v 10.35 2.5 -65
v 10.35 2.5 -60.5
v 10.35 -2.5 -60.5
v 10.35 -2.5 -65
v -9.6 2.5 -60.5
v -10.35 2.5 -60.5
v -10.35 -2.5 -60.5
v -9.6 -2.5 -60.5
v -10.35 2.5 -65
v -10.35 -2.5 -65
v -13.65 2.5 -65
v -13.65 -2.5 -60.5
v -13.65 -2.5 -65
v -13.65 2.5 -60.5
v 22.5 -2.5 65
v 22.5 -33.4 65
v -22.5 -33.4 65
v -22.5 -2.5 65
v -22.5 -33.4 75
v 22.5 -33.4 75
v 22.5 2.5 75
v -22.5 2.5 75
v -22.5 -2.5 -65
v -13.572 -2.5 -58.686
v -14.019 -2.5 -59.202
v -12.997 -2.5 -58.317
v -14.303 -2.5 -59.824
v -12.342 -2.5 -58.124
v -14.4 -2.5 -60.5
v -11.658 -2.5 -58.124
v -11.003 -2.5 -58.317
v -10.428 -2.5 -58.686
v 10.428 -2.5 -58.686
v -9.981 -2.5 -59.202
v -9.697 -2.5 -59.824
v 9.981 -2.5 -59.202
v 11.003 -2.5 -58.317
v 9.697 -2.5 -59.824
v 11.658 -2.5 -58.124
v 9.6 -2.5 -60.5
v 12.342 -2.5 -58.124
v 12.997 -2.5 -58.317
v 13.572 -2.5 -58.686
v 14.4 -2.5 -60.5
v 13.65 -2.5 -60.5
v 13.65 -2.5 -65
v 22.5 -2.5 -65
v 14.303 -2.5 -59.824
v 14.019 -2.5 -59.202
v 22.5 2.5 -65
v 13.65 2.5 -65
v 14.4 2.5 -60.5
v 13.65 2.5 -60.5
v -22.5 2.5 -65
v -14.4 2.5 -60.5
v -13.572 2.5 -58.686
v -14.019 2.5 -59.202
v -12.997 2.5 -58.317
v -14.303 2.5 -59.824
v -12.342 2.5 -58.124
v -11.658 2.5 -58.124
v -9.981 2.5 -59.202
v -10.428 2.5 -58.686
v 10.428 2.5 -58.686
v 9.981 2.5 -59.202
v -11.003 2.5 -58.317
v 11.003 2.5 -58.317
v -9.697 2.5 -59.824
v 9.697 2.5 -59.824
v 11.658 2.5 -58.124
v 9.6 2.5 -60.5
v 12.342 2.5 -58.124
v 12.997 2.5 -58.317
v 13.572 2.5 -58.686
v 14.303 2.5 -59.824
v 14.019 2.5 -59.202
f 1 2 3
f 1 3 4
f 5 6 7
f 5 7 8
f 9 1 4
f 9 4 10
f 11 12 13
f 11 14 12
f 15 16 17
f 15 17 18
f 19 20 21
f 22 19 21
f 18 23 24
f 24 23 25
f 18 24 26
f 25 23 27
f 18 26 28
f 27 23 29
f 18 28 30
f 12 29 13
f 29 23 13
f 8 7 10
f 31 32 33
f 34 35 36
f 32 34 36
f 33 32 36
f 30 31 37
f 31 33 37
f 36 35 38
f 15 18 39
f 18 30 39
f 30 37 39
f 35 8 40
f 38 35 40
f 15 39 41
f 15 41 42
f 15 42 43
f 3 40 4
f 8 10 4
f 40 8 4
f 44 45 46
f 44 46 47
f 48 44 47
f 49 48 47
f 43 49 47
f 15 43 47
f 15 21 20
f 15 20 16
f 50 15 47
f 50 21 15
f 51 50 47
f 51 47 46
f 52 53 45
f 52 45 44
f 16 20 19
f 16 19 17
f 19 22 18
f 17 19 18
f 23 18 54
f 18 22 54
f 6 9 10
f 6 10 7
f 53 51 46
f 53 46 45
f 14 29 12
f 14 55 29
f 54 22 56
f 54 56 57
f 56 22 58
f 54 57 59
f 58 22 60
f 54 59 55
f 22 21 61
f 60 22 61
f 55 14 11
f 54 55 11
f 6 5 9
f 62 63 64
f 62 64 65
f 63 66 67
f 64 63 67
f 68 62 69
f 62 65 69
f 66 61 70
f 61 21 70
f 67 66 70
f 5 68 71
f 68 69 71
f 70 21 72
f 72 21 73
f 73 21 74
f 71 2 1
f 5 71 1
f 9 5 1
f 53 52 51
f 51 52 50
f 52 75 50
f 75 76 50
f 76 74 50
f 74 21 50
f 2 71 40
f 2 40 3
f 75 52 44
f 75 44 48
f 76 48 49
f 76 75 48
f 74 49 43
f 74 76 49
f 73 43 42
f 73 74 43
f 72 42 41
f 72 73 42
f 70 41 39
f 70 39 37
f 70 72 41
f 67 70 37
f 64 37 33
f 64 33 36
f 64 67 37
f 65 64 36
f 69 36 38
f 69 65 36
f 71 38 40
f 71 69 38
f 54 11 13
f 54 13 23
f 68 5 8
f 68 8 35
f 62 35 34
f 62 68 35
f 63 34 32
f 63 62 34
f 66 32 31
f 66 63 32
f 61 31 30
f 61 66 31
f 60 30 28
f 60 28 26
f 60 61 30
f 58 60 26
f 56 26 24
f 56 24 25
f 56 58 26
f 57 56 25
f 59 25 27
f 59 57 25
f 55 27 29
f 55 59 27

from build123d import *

# Parameters (mm, degrees)
BOSS_EXTRUDE1_DEPTH = 2.5
SKETCH4_W           = 54.285
SKETCH4_H           = 130
CUT_EXTRUDE1_DEPTH  = 120
SKETCH5_W           = 10
SKETCH5_H           = 35.9
BOSS_EXTRUDE2_DEPTH = 22.5


with BuildPart() as part:
    # Sketch2 → Boss-Extrude1 (new, symmetric)
    with BuildSketch(Plane(origin=(0, 0, 0), x_dir=(1, 0, 0), z_dir=(0, 1, 0))):
        with BuildLine():
            Line((-13.65, 65), (-76.785, 65))
            Line((-76.785, 65), (-76.785, -65))
            Line((-76.785, -65), (76.785, -65))
            Line((76.785, -65), (76.785, 65))
            Line((76.785, 65), (13.65, 65))
            Line((13.65, 65), (13.65, 60.5))
            Line((13.65, 60.5), (14.4, 60.5))
            ThreePointArc((14.4, 60.5), (12, 58.1), (9.6, 60.5))
            Line((9.6, 60.5), (10.35, 60.5))
            Line((10.35, 60.5), (10.35, 65))
            Line((10.35, 65), (-10.35, 65))
            Line((-10.35, 65), (-10.35, 60.5))
            Line((-10.35, 60.5), (-9.6, 60.5))
            ThreePointArc((-9.6, 60.5), (-12, 58.1), (-14.4, 60.5))
            Line((-14.4, 60.5), (-13.65, 60.5))
            Line((-13.65, 60.5), (-13.65, 65))
        make_face()
    extrude(amount=BOSS_EXTRUDE1_DEPTH, both=True)

    # Sketch4 → Cut-Extrude1 (cut)
    with BuildSketch(Plane(origin=(0, 2.5, 0), x_dir=(1, 0, 0), z_dir=(0, 1, 0))):
        with Locations((-49.6425, 0)):
            Rectangle(SKETCH4_W, SKETCH4_H)
        with Locations((49.6425, 0)):
            Rectangle(SKETCH4_W, SKETCH4_H)
    extrude(amount=-CUT_EXTRUDE1_DEPTH, mode=Mode.SUBTRACT)

    # Sketch5 → Boss-Extrude2 (add, symmetric)
    with BuildSketch(Plane(origin=(0, 0, 0), x_dir=(0, 0, -1), z_dir=(1, 0, 0))):
        with Locations((-70, -15.45)):
            Rectangle(SKETCH5_W, SKETCH5_H)
    extrude(amount=BOSS_EXTRUDE2_DEPTH, both=True)


solid = part.part
